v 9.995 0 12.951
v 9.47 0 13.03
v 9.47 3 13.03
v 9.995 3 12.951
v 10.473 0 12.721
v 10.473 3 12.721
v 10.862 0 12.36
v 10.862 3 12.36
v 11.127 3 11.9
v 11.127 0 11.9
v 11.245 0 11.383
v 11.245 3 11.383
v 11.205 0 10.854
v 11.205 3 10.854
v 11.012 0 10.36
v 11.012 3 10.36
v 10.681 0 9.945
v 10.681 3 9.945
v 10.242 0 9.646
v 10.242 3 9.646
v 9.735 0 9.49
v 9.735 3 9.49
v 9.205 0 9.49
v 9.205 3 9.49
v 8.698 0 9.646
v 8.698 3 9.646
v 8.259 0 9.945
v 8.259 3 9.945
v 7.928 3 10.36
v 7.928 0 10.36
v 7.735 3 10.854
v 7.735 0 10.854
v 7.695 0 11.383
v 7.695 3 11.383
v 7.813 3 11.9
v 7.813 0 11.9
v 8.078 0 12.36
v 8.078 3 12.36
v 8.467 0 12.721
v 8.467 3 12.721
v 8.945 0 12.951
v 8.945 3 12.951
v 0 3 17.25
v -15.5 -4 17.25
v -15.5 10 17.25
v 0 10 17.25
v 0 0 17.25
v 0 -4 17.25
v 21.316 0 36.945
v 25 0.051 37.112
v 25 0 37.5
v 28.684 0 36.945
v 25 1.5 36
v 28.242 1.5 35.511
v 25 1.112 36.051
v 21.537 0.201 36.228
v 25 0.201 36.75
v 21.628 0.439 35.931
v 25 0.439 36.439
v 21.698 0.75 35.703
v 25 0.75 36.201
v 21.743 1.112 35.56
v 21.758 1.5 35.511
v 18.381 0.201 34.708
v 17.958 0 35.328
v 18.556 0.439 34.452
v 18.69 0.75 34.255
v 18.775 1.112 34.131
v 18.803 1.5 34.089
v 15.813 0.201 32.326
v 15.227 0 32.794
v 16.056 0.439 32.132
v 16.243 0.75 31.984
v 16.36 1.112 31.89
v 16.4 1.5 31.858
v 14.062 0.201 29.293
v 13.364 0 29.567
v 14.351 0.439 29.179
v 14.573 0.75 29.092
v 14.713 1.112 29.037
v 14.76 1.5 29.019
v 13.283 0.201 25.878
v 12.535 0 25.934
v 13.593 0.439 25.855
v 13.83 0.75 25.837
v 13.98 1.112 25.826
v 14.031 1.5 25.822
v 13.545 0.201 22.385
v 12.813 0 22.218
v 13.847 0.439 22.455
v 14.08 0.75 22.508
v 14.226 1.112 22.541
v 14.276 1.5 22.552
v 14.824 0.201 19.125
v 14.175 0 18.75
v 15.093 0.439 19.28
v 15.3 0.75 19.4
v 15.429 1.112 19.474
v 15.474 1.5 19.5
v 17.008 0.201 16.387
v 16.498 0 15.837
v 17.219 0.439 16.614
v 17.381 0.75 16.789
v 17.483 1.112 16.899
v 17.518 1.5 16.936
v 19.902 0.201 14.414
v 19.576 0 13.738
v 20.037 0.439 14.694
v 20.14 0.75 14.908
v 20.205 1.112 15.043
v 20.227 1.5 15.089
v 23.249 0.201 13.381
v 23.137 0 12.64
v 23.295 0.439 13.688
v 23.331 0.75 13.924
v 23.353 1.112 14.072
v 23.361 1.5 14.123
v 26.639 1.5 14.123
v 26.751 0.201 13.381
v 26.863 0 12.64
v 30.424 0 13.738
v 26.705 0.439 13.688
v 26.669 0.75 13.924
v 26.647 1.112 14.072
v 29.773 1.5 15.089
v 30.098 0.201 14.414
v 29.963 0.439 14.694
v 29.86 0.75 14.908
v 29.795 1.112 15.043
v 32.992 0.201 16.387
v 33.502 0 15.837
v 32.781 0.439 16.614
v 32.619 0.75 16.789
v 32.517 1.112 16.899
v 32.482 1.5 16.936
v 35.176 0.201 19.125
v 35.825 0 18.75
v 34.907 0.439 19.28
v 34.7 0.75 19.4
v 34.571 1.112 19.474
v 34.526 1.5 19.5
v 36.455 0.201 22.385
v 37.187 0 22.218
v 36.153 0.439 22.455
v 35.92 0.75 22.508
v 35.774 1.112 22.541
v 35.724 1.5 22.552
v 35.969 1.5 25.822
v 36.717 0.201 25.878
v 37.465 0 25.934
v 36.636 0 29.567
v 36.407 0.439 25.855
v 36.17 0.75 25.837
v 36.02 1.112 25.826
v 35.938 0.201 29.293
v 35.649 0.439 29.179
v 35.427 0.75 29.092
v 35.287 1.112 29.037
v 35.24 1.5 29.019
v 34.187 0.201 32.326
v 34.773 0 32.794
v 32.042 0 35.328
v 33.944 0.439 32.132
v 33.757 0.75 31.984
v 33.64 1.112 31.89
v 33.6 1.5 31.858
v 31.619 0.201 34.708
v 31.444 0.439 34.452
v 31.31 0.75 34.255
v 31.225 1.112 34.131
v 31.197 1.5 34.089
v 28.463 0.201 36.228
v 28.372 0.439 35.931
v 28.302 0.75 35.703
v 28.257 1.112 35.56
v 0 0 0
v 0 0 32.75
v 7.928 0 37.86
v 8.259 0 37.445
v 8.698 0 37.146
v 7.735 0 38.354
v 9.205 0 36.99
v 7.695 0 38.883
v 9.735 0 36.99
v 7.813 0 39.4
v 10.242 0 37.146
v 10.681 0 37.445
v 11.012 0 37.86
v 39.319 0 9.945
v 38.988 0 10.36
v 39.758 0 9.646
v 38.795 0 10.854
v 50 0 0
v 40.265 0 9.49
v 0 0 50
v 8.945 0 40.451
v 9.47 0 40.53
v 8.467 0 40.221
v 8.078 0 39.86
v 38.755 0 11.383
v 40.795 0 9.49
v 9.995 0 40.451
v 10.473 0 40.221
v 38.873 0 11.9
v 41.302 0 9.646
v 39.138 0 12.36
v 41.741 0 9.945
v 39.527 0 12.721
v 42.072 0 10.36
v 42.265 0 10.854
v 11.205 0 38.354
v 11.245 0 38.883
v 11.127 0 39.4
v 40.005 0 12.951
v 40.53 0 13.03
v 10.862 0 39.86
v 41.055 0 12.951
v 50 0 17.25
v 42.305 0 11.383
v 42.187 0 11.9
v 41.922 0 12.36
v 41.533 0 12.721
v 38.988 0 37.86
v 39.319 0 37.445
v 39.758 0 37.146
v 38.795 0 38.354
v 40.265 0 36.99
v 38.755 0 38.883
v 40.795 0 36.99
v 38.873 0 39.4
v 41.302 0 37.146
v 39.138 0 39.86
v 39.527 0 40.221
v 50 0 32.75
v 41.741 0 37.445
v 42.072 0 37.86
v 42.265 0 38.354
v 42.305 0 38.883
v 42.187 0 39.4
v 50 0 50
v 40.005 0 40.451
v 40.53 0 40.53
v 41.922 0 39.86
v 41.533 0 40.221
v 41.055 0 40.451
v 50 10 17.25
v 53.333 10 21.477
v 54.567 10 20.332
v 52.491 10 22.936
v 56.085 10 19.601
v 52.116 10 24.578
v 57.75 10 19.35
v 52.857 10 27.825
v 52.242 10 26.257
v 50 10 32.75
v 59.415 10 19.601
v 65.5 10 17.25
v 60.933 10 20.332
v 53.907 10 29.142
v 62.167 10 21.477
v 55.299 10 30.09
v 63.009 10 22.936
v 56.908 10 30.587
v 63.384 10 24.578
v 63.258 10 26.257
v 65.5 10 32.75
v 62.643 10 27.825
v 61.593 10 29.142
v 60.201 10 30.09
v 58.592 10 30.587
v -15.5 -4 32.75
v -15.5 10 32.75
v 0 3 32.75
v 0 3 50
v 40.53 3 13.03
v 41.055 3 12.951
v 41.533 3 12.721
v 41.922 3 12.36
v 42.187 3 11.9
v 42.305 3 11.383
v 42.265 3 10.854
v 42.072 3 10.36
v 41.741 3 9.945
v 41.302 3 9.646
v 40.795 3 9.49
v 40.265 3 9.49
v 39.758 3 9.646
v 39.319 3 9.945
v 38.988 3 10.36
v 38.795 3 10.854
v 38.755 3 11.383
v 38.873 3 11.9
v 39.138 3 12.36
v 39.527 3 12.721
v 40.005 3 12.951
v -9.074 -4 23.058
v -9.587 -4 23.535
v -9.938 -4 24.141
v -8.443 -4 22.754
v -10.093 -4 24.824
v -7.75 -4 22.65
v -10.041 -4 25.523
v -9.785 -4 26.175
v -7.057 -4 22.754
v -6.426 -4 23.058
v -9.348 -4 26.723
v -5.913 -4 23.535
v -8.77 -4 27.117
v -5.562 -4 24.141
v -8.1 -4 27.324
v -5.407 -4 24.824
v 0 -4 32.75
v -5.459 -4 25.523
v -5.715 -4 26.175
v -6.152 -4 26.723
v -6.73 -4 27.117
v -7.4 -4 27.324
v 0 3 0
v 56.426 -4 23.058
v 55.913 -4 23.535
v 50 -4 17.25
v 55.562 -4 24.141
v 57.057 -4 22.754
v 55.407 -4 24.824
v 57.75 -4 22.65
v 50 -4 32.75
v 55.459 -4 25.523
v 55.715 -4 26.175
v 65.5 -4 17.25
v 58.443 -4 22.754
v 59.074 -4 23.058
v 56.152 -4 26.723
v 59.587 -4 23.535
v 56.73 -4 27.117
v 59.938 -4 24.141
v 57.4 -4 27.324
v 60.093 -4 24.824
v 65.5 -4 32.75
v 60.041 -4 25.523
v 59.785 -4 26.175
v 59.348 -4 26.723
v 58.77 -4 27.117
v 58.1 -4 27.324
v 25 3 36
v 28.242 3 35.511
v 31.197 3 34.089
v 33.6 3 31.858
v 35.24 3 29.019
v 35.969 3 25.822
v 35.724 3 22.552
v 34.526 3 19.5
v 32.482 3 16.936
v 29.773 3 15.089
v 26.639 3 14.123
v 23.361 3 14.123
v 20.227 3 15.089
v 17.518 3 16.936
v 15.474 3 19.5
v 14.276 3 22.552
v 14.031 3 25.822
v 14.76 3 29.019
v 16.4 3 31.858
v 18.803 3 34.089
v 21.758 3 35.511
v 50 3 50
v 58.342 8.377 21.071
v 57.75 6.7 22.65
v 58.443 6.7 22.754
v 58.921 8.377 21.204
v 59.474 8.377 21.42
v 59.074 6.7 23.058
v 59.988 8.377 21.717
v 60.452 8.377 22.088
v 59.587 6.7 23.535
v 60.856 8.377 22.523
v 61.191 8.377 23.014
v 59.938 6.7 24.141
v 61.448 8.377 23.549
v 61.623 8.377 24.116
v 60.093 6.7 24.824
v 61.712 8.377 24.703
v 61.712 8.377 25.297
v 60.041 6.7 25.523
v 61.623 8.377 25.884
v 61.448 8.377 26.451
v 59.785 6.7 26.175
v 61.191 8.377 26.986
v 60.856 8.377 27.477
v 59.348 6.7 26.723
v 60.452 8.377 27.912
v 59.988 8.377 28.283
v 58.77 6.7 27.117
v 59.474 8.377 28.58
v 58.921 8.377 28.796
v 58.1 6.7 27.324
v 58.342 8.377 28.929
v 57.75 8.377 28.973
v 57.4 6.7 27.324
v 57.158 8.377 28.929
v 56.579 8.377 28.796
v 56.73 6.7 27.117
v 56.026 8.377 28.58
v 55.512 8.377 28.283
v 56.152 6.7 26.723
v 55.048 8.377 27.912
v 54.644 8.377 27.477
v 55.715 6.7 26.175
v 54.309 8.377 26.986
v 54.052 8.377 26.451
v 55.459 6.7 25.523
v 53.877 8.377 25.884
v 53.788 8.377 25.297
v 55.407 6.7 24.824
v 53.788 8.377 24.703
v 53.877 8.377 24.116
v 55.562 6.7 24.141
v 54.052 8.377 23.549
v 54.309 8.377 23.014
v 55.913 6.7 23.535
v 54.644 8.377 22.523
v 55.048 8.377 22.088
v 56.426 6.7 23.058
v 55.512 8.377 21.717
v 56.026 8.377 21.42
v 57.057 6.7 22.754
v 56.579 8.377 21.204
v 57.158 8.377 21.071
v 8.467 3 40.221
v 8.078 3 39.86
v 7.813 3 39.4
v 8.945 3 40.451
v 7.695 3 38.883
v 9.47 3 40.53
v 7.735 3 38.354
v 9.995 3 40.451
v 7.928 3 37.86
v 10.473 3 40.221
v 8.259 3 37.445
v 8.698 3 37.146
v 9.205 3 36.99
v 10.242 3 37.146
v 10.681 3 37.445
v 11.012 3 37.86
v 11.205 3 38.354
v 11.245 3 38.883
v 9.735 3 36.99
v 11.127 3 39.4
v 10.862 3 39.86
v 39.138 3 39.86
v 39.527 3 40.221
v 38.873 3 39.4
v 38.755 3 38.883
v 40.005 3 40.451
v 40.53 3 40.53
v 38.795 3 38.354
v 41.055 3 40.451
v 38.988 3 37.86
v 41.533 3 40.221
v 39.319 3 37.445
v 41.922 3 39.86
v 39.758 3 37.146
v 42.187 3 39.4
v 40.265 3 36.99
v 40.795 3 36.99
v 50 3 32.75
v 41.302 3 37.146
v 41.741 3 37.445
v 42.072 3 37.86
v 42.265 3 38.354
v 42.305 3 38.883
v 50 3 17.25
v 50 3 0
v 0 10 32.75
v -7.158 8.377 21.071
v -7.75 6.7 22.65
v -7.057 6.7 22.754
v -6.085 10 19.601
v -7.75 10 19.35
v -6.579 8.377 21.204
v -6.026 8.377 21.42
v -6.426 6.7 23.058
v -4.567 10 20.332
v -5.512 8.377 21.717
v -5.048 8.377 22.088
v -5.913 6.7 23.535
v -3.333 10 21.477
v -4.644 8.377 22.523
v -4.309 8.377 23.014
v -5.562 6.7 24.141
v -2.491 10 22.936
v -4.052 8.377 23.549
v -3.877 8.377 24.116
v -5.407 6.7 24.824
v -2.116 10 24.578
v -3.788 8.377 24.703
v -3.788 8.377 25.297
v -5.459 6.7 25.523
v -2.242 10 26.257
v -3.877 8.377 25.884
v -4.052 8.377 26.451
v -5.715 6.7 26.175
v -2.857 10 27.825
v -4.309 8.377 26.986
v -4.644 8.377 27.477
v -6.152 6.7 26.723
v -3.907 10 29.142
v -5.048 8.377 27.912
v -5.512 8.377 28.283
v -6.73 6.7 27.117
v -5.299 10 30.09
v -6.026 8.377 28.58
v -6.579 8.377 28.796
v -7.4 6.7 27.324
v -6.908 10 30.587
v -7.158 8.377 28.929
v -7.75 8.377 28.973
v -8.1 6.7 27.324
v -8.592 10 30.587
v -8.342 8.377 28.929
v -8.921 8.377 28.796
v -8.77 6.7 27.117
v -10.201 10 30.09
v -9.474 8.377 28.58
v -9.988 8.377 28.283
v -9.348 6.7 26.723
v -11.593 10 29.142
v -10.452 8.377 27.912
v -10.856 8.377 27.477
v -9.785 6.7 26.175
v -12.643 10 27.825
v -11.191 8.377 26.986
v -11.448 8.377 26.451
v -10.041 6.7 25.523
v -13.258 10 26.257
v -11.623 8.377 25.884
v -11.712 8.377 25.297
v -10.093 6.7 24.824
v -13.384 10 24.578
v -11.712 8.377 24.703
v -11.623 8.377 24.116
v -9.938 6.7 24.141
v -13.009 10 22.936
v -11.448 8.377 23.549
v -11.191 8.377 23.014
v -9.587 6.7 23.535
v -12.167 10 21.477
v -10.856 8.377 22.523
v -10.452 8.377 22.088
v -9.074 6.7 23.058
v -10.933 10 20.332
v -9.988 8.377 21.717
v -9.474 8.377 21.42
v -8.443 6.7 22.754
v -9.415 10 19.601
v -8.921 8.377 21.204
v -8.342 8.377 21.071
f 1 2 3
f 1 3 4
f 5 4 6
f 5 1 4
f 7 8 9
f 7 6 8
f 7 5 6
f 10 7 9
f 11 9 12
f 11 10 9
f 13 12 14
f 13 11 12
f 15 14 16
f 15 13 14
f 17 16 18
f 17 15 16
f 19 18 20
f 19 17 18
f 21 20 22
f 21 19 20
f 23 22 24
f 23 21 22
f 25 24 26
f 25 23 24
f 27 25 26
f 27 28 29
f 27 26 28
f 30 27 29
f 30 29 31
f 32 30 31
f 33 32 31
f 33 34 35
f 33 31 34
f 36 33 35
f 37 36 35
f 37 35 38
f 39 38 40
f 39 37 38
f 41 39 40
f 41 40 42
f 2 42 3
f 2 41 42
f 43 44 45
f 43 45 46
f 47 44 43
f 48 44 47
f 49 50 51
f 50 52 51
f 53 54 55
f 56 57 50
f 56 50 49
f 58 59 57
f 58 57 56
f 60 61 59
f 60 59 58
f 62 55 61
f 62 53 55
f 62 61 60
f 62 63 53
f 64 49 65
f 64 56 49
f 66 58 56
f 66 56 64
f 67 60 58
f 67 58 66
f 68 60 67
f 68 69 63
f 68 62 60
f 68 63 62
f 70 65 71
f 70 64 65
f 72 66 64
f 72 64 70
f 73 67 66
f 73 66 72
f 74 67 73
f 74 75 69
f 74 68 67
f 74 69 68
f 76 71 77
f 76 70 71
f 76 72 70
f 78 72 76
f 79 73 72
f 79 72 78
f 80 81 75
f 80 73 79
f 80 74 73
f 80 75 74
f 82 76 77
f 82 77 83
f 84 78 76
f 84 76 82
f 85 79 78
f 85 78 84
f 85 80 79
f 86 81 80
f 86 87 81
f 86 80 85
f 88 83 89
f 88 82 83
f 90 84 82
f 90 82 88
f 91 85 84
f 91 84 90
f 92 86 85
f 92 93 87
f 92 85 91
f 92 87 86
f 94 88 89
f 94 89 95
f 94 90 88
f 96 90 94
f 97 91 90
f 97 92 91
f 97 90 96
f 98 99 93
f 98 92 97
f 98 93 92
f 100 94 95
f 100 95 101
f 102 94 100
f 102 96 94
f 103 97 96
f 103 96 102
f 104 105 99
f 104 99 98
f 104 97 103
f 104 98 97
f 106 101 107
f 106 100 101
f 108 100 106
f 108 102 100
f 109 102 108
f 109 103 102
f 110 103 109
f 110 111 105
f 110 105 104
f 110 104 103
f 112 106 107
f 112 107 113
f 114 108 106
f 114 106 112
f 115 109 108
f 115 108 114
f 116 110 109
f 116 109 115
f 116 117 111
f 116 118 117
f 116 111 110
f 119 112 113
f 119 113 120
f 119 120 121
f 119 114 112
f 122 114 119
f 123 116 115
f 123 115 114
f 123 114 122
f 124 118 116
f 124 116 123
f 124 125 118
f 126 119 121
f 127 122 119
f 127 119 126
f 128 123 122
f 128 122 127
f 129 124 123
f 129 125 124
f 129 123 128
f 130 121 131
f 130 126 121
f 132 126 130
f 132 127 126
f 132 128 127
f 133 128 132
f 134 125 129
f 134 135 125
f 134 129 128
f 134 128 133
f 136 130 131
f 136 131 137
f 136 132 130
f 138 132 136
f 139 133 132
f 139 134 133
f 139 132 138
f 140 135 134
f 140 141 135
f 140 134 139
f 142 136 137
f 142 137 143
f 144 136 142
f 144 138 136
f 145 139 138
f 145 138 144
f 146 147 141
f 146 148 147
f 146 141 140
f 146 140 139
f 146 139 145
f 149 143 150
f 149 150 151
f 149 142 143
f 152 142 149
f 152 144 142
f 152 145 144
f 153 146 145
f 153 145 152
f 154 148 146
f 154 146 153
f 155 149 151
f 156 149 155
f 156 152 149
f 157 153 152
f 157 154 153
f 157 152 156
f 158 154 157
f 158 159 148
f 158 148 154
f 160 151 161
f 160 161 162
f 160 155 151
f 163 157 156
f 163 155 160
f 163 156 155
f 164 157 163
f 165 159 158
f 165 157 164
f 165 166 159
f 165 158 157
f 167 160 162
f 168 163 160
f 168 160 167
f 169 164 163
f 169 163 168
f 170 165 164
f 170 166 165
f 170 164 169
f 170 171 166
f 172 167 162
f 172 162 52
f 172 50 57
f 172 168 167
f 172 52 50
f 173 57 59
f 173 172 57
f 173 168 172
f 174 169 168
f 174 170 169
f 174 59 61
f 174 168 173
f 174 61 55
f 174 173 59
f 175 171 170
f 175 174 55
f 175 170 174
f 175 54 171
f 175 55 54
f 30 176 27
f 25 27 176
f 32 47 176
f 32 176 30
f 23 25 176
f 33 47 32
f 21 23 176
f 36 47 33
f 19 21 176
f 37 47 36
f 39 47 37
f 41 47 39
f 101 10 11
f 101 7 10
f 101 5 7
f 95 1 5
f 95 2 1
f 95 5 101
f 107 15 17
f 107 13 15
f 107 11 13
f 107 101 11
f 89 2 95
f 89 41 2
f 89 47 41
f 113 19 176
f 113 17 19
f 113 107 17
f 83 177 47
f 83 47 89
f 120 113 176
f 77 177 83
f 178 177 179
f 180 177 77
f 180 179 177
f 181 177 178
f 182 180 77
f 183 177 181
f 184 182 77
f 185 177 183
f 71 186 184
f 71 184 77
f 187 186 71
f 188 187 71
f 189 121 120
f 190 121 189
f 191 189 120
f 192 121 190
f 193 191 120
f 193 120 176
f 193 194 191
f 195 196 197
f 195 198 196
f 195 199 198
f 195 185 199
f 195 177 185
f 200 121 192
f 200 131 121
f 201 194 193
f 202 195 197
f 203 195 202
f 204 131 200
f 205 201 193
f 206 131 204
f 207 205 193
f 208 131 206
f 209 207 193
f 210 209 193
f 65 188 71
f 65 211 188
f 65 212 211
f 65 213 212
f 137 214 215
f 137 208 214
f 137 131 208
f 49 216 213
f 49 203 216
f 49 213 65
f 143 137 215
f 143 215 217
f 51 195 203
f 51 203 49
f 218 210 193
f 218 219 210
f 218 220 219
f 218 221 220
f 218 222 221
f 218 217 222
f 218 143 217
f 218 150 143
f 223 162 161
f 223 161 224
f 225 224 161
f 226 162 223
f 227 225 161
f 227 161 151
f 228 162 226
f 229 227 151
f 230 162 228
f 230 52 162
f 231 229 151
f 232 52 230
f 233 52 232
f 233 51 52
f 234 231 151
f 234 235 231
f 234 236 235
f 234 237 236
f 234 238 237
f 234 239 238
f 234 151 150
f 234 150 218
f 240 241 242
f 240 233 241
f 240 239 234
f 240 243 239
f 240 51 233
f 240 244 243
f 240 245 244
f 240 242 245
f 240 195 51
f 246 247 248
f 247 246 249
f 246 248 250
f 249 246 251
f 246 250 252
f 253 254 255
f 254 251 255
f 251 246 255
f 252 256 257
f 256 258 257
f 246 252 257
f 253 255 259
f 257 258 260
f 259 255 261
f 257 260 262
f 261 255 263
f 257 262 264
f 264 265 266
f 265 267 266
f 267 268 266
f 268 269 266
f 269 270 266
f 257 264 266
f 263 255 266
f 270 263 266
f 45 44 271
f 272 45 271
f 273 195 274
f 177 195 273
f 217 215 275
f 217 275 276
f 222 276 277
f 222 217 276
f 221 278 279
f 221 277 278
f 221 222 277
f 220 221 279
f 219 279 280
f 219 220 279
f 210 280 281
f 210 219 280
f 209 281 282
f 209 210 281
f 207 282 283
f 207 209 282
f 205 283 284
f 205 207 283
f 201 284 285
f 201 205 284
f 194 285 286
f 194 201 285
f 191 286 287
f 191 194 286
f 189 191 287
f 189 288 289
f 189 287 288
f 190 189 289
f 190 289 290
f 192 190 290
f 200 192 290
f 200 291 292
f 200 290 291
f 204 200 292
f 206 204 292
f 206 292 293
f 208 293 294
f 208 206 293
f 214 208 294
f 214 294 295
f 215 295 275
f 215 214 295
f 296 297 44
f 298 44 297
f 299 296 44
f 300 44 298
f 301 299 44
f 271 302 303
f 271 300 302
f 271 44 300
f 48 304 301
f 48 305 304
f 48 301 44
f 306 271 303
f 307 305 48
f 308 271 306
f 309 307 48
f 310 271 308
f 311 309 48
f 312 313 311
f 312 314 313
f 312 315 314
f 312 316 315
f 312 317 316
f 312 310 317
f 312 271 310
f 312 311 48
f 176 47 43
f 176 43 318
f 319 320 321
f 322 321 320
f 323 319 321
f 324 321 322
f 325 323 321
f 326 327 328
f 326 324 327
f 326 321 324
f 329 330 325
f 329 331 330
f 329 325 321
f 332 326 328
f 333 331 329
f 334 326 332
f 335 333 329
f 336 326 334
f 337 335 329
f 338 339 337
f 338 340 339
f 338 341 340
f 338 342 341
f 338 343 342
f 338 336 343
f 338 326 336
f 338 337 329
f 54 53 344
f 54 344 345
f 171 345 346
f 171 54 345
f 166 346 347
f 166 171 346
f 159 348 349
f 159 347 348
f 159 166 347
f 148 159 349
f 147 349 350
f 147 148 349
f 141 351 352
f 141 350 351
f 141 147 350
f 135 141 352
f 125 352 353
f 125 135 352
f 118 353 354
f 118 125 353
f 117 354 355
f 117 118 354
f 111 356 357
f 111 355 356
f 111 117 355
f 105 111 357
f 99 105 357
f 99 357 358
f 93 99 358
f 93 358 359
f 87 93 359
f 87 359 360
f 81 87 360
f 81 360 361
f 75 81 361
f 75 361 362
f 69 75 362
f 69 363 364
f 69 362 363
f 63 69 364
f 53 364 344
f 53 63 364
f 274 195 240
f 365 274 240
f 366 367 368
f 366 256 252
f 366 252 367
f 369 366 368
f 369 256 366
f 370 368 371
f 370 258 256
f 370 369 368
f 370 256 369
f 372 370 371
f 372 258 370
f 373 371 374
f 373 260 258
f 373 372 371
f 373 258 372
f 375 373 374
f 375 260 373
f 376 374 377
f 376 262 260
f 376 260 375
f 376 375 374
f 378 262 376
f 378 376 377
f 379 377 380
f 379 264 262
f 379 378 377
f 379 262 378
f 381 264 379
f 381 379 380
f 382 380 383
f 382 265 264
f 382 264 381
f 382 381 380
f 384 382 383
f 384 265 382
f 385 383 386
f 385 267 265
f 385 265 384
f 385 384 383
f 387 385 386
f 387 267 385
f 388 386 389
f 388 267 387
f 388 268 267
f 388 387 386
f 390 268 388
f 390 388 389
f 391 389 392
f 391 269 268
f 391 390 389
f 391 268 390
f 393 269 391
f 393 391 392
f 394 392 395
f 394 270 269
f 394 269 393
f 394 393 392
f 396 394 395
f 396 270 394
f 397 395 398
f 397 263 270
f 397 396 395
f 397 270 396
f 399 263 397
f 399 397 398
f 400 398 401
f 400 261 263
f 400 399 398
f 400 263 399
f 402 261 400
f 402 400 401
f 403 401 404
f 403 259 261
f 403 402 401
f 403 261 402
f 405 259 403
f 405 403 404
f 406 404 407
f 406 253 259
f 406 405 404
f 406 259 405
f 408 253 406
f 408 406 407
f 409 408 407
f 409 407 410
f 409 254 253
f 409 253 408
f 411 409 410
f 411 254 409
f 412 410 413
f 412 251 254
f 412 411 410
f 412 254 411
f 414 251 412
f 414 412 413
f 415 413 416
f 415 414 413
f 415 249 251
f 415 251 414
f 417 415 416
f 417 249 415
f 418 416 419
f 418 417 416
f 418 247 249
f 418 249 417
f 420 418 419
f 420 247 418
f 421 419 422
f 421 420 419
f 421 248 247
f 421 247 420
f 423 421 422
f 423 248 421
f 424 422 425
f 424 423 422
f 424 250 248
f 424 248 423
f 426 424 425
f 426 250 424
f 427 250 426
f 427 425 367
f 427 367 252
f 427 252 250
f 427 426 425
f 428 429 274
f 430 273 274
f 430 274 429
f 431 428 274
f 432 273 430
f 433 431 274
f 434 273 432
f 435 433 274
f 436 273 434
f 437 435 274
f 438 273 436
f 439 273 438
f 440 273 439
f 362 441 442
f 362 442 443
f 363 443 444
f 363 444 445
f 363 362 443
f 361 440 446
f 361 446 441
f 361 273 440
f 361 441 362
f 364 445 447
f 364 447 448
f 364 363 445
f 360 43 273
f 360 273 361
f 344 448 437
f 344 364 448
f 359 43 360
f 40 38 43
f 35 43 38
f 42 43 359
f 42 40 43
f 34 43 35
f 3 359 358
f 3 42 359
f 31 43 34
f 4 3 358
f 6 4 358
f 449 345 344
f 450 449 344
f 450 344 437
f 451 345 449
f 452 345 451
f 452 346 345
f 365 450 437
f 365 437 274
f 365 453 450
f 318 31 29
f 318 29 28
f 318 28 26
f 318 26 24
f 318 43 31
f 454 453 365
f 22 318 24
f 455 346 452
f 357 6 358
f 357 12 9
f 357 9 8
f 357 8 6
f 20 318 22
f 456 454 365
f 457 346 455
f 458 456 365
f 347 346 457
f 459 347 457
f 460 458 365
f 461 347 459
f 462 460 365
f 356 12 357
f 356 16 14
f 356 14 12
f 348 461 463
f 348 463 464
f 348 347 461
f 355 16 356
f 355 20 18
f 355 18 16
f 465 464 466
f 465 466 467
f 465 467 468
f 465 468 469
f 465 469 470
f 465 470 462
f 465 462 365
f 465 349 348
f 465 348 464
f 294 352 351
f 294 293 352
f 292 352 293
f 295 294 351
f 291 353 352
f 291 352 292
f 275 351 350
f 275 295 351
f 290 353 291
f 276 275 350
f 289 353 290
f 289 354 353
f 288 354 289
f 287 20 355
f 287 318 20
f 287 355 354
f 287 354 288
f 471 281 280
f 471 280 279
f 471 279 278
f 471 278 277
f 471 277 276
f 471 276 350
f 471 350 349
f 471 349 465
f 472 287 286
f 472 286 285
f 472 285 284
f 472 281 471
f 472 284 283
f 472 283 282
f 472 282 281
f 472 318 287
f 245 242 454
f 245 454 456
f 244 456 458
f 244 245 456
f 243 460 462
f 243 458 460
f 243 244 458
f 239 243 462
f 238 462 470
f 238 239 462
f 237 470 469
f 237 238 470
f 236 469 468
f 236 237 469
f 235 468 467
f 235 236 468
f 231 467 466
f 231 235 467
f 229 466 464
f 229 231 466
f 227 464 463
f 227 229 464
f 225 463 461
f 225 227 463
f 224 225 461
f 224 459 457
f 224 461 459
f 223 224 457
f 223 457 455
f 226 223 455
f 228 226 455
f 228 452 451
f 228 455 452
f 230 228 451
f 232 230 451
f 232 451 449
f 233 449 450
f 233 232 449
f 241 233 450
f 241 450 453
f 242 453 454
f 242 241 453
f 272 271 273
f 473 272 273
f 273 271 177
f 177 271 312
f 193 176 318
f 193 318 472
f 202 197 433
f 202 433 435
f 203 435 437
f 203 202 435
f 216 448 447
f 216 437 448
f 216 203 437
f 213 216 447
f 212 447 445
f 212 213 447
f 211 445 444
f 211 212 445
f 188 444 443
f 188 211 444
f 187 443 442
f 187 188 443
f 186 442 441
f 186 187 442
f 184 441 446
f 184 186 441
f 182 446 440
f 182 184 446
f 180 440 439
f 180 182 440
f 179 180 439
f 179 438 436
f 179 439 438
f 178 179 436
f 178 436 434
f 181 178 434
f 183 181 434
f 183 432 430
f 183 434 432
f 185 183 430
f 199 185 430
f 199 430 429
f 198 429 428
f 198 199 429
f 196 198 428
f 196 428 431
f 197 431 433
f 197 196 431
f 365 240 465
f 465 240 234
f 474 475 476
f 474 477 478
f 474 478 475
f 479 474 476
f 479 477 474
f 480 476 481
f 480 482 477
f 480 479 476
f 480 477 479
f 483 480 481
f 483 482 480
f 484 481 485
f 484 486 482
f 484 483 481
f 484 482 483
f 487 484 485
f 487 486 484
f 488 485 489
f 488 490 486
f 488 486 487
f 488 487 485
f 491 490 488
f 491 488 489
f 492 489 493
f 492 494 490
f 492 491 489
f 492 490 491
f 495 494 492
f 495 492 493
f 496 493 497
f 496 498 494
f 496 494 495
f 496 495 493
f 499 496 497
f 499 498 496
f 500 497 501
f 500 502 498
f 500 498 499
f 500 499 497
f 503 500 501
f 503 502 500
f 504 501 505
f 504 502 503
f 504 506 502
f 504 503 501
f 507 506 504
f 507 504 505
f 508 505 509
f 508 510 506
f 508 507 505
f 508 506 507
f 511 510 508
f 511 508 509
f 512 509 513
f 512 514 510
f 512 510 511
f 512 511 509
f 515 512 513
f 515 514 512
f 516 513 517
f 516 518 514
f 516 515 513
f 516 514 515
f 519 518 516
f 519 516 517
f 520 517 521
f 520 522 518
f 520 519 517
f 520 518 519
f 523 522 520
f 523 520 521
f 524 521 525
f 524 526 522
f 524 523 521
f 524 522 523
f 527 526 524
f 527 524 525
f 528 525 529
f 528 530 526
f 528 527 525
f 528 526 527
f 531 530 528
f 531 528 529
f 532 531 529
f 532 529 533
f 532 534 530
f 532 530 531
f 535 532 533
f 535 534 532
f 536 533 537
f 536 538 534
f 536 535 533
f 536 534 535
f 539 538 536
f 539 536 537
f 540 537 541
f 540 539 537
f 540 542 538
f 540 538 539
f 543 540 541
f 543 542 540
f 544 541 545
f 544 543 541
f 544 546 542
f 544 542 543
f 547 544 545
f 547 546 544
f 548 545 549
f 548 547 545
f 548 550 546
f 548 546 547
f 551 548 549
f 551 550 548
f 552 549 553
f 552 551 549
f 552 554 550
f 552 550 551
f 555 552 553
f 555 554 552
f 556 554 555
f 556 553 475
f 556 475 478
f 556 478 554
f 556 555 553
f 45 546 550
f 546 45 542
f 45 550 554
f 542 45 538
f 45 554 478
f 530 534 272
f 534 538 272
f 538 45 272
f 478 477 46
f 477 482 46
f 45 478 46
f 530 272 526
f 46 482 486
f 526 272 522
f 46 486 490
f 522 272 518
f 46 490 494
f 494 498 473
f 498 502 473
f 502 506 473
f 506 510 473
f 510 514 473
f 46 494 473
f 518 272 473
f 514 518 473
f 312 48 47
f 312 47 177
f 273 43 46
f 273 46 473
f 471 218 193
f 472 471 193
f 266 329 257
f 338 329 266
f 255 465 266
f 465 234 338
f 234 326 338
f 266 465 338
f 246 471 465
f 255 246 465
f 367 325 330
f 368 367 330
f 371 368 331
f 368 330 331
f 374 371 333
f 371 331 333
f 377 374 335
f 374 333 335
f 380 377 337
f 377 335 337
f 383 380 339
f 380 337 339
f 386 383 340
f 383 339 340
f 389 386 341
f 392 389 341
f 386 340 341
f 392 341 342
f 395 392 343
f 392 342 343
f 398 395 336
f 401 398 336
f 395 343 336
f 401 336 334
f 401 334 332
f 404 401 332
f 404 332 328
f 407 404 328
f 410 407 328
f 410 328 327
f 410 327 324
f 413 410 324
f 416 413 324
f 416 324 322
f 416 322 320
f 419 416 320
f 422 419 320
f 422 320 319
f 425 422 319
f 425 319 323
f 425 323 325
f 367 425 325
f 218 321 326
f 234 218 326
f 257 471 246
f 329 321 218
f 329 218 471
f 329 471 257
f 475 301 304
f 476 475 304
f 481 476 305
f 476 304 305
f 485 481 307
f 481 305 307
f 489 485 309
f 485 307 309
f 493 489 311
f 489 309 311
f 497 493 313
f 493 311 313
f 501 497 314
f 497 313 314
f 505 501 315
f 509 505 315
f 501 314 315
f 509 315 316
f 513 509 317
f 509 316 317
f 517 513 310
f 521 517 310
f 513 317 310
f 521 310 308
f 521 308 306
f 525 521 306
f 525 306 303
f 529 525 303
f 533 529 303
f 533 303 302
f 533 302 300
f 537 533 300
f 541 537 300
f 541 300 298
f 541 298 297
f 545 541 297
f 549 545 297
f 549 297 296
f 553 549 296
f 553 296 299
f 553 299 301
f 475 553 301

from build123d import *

# Parameters (mm, degrees)
SKETCH1_W               = 50
SKETCH1_H               = 50
BOSS_EXTRUDE1_DEPTH     = 3
CUT_EXTRUDE1_DEPTH      = 71.774289117
CUT_EXTRUDE1_DEPTH_BACK = 71.774289117
SKETCH2_R               = 11
CUT_EXTRUDE2_DEPTH      = 71.774289117
CUT_EXTRUDE2_DEPTH_BACK = 71.774289117
SKETCH3_R               = 1.78
FILLET1_R               = 1.5
SKETCH4_W               = 15.5
SKETCH4_H               = 15.5
SKETCH4_R               = 2.35
BOSS_EXTRUDE3_DEPTH     = 10
BOSS_EXTRUDE4_START     = 4
SKETCH6_W               = 15.5
SKETCH6_H               = 15.5
SKETCH6_R               = 2.35
BOSS_EXTRUDE4_DEPTH     = 4
FILLET3_SIZE            = 3.3


with BuildPart() as part:
    # Sketch1 → Boss-Extrude1 (new body)
    with BuildSketch(Plane(origin=(0, 0, 0), x_dir=(1, 0, 0), z_dir=(0, 1, 0))):
        with Locations((25, -25)):
            Rectangle(SKETCH1_W, SKETCH1_H)
    extrude(amount=BOSS_EXTRUDE1_DEPTH)

    # Sketch2 → Cut-Extrude1 (cut, two sides: drawn at the far end of the back side and taken through both)
    with BuildSketch(Plane(origin=(0, 3, 0), x_dir=(1, 0, 0), z_dir=(0, 1, 0)).offset(-CUT_EXTRUDE1_DEPTH_BACK)):
        with Locations(Location((25, -25, 0), (0, 0, 270))):
            Circle(SKETCH2_R)
    extrude(amount=CUT_EXTRUDE1_DEPTH + CUT_EXTRUDE1_DEPTH_BACK, mode=Mode.SUBTRACT)

    # Sketch3 → Cut-Extrude2 (cut, two sides: drawn at the far end of the back side and taken through both)
    with BuildSketch(Plane(origin=(0, 3, 0), x_dir=(1, 0, 0), z_dir=(0, 1, 0)).offset(-CUT_EXTRUDE2_DEPTH_BACK)):
        with Locations(Location((9.47, -11.25, 0), (0, 0, 270))):
            Circle(SKETCH3_R)
        with Locations(Location((40.53, -11.25, 0), (0, 0, 270))):
            Circle(SKETCH3_R)
        with Locations(Location((40.53, -38.75, 0), (0, 0, 270))):
            Circle(SKETCH3_R)
        with Locations(Location((9.47, -38.75, 0), (0, 0, 270))):
            Circle(SKETCH3_R)
    extrude(amount=CUT_EXTRUDE2_DEPTH + CUT_EXTRUDE2_DEPTH_BACK, mode=Mode.SUBTRACT)

    # Fillet1
    fillet1_edges = [part.edges().sort_by_distance(p)[0] for p in [
        (25, 0, 14),
    ]]
    fillet(fillet1_edges, radius=FILLET1_R)

    # Sketch4 → Boss-Extrude3 (add)
    # profile 1 of 2: a face of its own
    with BuildSketch(Plane.XZ):
        with Locations((-7.75, 25)):
            Rectangle(SKETCH4_W, SKETCH4_H)
        with Locations(Location((-7.75, 25, 0), (0, 0, 270))):
            Circle(SKETCH4_R, mode=Mode.SUBTRACT)
    # profile 2 of 2: a face of its own
    with BuildSketch(Plane.XZ):
        with Locations((57.75, 25)):
            Rectangle(SKETCH4_W, SKETCH4_H)
        with Locations(Location((57.75, 25, 0), (0, 0, 270))):
            Circle(SKETCH4_R, mode=Mode.SUBTRACT)
    extrude(amount=-BOSS_EXTRUDE3_DEPTH)

    # Sketch6 → Boss-Extrude4 (add)
    # profile 1 of 2: a face of its own
    with BuildSketch(Plane.XZ.offset(BOSS_EXTRUDE4_START)):
        with Locations((-7.75, 25)):
            Rectangle(SKETCH6_W, SKETCH6_H)
        with Locations(Location((-7.75, 25, 0), (0, 0, 270))):
            Circle(SKETCH6_R, mode=Mode.SUBTRACT)
    # profile 2 of 2: a face of its own
    with BuildSketch(Plane.XZ.offset(BOSS_EXTRUDE4_START)):
        with Locations((57.75, 25)):
            Rectangle(SKETCH6_W, SKETCH6_H)
        with Locations(Location((57.75, 25, 0), (0, 0, 270))):
            Circle(SKETCH6_R, mode=Mode.SUBTRACT)
    extrude(amount=-BOSS_EXTRUDE4_DEPTH)

    # Fillet3
    # a fillet whose section is not a circle: 3.3 mm, written as the material it takes off along each edge
    with BuildSketch(Plane(origin=(-7.75, 10, 25), x_dir=(0, 0, -1), z_dir=(-1, 0, 0))) as fillet3_piece_1:
        with BuildLine():
            Bezier((2.35, FILLET3_SIZE), (2.35, 0), (2.35 + FILLET3_SIZE, 0), weights=[1, 0.016667517, 1])
            Line((2.35 + FILLET3_SIZE, 0), (2.35, 0))
            Line((2.35, 0), (2.35, FILLET3_SIZE))
        make_face()
    revolve(axis=Axis((-7.75, 10, 25), (0, -1, 0)), mode=Mode.SUBTRACT)
    with BuildSketch(Plane(origin=(57.75, 10, 25), x_dir=(0, 0, -1), z_dir=(-1, 0, 0))) as fillet3_piece_2:
        with BuildLine():
            Bezier((2.35, FILLET3_SIZE), (2.35, 0), (2.35 + FILLET3_SIZE, 0), weights=[1, 0.016667517, 1])
            Line((2.35 + FILLET3_SIZE, 0), (2.35, 0))
            Line((2.35, 0), (2.35, FILLET3_SIZE))
        make_face()
    revolve(axis=Axis((57.75, 10, 25), (0, -1, 0)), mode=Mode.SUBTRACT)


solid = part.part
